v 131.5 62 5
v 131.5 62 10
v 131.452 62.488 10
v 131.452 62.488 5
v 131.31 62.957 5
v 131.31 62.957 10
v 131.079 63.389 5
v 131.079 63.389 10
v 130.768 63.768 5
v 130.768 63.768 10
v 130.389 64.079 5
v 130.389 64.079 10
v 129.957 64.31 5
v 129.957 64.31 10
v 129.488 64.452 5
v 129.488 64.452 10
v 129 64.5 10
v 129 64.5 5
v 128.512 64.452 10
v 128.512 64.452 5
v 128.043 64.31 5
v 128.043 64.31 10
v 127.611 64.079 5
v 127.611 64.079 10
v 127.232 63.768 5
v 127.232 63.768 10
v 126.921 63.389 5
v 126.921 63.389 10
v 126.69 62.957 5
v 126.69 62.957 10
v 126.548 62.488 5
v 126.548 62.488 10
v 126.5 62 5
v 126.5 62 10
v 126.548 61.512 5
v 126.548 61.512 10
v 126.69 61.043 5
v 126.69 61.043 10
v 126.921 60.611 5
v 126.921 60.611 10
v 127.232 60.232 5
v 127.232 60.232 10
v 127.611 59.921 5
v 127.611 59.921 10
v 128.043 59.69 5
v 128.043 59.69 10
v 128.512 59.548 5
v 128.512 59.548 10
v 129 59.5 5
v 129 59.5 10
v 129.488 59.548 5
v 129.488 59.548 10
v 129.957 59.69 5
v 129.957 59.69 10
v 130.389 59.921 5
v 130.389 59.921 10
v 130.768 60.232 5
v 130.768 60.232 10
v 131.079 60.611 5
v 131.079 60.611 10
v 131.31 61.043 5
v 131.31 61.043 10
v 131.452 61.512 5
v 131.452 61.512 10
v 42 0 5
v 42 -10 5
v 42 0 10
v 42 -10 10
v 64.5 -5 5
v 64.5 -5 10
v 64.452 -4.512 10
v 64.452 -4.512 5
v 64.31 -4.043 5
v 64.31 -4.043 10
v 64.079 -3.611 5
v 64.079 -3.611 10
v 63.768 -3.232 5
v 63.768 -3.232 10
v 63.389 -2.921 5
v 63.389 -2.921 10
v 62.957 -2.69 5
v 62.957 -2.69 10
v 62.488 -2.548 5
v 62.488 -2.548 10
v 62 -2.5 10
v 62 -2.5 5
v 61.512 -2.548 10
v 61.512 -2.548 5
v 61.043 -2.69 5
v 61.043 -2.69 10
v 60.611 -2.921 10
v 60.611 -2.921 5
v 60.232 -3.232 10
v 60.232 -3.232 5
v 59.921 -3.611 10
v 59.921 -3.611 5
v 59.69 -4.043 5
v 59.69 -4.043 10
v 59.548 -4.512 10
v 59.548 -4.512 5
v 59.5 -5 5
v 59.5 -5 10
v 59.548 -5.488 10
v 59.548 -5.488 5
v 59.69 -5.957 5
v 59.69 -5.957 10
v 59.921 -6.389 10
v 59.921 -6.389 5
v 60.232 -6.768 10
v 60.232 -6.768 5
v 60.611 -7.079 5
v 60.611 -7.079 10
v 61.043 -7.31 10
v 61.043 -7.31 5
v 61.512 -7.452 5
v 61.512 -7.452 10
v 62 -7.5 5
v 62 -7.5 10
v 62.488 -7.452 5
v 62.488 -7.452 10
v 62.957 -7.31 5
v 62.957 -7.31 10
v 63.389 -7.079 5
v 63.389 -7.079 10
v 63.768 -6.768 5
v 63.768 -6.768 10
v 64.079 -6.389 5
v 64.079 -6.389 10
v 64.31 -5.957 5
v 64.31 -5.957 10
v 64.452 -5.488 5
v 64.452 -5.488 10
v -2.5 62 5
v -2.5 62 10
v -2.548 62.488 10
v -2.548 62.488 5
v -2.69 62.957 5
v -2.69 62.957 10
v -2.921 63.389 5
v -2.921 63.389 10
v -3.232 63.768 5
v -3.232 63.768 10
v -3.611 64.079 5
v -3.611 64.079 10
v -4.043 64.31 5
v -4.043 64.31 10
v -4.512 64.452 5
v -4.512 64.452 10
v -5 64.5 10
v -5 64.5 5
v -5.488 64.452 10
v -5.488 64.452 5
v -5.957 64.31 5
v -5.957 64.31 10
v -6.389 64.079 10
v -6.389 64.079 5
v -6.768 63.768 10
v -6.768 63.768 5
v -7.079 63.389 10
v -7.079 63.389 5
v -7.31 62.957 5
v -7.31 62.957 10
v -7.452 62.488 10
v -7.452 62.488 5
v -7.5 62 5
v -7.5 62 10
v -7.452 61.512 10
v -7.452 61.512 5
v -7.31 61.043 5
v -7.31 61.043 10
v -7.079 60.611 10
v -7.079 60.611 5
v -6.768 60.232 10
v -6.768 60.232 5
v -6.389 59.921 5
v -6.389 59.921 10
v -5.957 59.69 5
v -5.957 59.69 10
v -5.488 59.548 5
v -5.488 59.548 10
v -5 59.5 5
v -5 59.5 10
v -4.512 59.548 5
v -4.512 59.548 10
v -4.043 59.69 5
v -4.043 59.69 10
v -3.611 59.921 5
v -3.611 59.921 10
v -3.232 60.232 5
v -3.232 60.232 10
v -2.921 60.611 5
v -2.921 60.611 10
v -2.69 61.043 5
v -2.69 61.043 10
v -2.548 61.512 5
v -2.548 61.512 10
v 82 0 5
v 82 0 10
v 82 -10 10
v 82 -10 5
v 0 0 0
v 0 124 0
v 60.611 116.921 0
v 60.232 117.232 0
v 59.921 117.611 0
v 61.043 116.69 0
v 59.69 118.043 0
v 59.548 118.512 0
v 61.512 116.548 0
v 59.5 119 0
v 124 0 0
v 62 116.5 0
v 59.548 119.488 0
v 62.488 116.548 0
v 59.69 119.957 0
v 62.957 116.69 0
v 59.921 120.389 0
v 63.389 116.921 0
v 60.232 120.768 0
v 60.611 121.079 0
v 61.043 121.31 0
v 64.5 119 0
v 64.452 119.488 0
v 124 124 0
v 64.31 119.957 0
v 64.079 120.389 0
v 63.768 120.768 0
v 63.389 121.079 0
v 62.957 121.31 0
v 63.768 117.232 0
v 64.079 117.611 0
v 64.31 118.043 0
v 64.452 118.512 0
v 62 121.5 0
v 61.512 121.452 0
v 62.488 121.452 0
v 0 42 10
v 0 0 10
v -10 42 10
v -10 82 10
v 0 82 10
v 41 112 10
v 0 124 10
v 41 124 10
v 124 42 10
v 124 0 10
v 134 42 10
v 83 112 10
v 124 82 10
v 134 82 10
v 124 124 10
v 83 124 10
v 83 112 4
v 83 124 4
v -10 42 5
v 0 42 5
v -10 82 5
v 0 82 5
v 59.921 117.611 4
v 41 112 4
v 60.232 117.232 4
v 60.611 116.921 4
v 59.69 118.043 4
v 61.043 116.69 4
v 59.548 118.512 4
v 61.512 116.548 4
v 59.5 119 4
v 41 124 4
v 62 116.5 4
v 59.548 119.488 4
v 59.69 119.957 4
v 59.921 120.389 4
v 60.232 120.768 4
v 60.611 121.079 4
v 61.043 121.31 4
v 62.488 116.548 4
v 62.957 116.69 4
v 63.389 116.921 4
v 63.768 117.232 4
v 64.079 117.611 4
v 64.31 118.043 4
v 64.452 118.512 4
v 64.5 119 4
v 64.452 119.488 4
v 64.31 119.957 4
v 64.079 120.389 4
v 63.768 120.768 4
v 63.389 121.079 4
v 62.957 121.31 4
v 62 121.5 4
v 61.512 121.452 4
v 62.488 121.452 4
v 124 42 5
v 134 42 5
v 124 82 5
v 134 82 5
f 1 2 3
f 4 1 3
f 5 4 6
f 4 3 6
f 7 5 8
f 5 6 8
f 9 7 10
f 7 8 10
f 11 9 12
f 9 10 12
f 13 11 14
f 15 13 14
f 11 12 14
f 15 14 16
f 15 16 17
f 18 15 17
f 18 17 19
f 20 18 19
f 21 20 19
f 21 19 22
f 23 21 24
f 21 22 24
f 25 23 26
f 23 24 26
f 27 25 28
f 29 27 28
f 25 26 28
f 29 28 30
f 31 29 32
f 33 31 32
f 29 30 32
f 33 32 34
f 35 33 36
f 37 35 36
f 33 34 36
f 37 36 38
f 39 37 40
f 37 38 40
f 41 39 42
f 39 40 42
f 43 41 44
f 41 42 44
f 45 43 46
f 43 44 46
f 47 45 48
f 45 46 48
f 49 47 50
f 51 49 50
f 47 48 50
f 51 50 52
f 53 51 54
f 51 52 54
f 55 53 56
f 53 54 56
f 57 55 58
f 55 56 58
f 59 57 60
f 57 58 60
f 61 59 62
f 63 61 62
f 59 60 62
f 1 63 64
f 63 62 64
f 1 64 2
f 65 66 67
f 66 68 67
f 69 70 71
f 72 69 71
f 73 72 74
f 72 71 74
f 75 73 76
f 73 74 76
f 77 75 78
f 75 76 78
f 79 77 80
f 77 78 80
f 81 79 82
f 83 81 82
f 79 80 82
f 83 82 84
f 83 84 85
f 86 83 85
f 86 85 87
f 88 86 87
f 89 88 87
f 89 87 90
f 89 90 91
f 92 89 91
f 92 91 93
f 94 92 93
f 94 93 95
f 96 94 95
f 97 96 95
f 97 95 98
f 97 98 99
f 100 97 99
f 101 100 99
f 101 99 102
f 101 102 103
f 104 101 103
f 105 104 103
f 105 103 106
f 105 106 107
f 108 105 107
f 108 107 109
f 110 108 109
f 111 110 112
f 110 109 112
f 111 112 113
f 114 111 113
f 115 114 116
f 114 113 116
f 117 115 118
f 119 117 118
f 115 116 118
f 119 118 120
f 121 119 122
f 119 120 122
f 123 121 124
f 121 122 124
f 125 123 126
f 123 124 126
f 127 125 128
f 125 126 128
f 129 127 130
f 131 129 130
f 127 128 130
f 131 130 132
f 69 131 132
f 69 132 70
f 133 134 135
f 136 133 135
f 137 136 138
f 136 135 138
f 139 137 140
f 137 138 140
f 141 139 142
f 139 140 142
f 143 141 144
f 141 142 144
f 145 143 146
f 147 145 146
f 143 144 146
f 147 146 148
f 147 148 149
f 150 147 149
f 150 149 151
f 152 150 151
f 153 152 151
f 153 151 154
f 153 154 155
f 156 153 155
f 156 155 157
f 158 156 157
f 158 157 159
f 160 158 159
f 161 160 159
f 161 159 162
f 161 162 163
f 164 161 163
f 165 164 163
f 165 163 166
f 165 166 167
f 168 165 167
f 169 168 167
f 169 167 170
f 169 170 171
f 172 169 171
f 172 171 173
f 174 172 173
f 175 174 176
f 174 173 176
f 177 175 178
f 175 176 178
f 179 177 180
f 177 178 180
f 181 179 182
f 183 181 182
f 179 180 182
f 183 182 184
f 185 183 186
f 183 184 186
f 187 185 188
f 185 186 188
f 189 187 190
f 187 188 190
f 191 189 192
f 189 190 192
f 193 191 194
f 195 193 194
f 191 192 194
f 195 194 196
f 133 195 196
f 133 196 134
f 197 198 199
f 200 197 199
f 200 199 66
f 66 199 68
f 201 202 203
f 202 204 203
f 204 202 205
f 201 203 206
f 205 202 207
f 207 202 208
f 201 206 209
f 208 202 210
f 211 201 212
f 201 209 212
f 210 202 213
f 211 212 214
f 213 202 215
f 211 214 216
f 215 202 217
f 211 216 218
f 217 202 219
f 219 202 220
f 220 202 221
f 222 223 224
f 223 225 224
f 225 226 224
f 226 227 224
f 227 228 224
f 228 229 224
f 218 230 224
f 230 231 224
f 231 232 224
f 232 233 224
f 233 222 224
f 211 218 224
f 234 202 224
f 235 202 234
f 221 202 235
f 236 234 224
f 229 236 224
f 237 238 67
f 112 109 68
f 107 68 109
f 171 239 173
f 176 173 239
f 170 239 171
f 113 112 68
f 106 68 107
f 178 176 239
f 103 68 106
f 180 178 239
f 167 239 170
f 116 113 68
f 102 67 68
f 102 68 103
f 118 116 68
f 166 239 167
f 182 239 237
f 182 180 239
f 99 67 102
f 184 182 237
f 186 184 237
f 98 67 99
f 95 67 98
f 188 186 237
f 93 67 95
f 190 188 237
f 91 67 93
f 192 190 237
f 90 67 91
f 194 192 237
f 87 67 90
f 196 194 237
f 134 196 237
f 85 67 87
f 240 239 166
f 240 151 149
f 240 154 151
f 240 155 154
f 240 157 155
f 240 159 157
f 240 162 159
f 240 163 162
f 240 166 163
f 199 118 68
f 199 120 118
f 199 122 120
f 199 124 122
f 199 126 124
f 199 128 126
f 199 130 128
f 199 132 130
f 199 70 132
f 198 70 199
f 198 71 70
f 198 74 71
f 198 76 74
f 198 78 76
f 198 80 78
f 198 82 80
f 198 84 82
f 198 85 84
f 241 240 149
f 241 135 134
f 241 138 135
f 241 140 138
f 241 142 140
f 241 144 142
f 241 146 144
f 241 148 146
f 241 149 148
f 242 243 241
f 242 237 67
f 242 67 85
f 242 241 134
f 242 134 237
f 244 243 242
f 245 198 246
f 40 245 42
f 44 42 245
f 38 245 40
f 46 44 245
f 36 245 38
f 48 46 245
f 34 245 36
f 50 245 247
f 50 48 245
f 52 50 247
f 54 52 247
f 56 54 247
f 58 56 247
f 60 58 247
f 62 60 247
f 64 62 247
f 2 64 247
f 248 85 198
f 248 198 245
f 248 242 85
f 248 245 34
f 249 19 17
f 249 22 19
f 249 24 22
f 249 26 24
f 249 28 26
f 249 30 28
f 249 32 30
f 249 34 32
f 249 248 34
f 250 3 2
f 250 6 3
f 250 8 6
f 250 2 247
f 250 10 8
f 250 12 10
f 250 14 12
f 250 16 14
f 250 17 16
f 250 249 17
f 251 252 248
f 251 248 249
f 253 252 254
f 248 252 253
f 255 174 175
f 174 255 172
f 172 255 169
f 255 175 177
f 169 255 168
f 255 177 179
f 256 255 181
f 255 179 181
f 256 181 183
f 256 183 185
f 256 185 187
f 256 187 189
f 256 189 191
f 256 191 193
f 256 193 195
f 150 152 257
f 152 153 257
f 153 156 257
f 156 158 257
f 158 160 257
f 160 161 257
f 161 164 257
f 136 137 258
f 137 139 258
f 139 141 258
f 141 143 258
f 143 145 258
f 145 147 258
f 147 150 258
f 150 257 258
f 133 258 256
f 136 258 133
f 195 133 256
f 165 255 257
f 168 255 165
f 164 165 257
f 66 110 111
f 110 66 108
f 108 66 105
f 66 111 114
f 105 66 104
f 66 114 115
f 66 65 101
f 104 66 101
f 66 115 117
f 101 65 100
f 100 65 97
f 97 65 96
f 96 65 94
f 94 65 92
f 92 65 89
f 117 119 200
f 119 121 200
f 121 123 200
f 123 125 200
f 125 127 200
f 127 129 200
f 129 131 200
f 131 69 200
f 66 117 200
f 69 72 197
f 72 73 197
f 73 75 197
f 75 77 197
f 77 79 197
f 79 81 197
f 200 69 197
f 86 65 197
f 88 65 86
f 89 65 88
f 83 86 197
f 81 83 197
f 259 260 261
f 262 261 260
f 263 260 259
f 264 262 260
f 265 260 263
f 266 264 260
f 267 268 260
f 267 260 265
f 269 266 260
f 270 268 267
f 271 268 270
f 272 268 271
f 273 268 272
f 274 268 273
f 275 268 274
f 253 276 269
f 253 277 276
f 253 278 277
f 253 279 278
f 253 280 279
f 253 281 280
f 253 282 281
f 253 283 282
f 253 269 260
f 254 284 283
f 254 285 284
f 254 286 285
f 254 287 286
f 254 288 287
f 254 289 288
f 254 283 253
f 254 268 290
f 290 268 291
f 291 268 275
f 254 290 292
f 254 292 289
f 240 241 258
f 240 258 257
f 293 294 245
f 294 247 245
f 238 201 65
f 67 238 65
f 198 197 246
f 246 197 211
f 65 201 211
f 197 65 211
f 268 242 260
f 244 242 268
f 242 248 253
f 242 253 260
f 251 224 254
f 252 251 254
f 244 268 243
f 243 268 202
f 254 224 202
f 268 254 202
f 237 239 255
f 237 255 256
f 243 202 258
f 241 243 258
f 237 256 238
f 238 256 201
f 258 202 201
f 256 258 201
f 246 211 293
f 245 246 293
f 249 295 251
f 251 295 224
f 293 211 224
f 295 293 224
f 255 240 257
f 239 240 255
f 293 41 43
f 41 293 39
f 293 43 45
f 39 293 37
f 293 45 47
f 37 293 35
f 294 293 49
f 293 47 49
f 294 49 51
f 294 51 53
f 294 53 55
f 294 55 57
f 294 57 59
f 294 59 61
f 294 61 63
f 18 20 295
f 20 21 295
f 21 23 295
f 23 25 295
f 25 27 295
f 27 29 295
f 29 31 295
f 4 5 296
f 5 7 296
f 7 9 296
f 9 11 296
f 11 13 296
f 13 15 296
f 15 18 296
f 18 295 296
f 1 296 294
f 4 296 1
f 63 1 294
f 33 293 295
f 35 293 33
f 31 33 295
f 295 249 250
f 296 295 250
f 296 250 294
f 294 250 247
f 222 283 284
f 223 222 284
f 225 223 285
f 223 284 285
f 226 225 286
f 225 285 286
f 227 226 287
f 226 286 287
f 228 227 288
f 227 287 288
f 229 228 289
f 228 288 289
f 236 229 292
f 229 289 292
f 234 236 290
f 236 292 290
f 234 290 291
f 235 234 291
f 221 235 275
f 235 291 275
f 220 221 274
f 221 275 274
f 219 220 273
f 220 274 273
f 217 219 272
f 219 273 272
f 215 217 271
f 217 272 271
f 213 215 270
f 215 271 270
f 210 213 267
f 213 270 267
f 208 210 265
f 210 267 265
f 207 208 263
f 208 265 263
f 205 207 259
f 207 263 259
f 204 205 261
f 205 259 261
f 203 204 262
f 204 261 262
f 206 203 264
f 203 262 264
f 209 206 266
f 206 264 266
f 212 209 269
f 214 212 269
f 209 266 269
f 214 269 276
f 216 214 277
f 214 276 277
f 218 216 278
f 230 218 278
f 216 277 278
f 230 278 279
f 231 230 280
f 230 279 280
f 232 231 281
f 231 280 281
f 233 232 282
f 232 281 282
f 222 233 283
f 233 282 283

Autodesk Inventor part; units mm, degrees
ref_plane "YZ Plane" through (0, 0, 0) normal (1, 0, 0) x (0, 1, 0)
ref_plane "XZ Plane" through (0, 0, 0) normal (0, 1, 0) x (-1, 0, 0)
ref_plane "XY Plane" through (0, 0, 0) normal (0, 0, 1) x (1, 0, 0)
sketch "Sketch1" plane through (0, 0, 0) normal (0, 0, 1) x (1, 0, 0)
  line L0 (0, 0) -> (124, 0)
  line L1 (124, 0) -> (124, 124)
  line L2 (124, 124) -> (0, 124)
  line L3 (0, 124) -> (0, 0)
  dimension "d0" = 124
  dimension "d1" = 124
extrude "Extrusion1" add sketch "Sketch1" along normal blind 10
sketch "Sketch2" plane through (0, 0, 10) normal (0, 0, 1) x (1, 0, 0)
  line L0 (0, 124) -> (0, 0) projected
  line L1 (0, 82) -> (-10, 82)
  line L2 (-10, 82) -> (-10, 42)
  line L3 (-10, 42) -> (0, 42)
  line L4 (0, 42) -> (0, 82)
  line L5 (0, 0) -> (124, 0) projected
  line L6 (42, 0) -> (82, 0)
  line L7 (82, 0) -> (82, -10)
  line L8 (82, -10) -> (42, -10)
  line L9 (42, -10) -> (42, 0)
  circle A0 centre (-5, 62) radius 2.5
  circle A1 centre (62, -5) radius 2.5
  point P0 (42, -5)
  point P1 (-10, 62)
  point P2 (-5, 82)
  point P3 (62, -10)
  point P4 (62, 0)
  point P5 (62, 0)
  point P6 (0, 62)
  dimension "d4" = 10
  dimension "d5" = 40
  dimension "d6" = 40
  dimension "d7" = 10
  dimension "d8" = 5
  dimension "d9" = 5
extrude "Extrusion2" add sketch "Sketch2" against normal blind 5
sketch "Sketch3" plane through (0, 0, 10) normal (0, 0, 1) x (1, 0, 0)
  line L0 (124, 124) -> (0, 124) projected
  line L1 (41, 124) -> (83, 124)
  line L2 (83, 124) -> (83, 112)
  line L3 (83, 112) -> (41, 112)
  line L4 (41, 112) -> (41, 124)
  point P0 (0, 0)
  point P1 (62, 112)
  point P2 (62, 124)
  dimension "d12" = 42
  dimension "d13" = 12
extrude "Extrusion3" cut sketch "Sketch3" against normal blind 6
sketch "Sketch4" plane through (0, 0, 4) normal (0, 0, 1) x (1, 0, 0)
  line L0 (41, 124) -> (83, 124) construction
  line L1 (41, 112) -> (41, 124) construction
  line L2 (83, 112) -> (41, 112) construction
  line L3 (83, 124) -> (83, 112) construction
  circle A0 centre (62, 119) radius 2.5
  point P0 (0, 0)
  point P1 (62, 124)
  dimension "d16" = 5
  dimension "d17" = 5
extrude "Extrusion4" cut sketch "Sketch4" against normal through all
sketch "Sketch5" plane through (0, 0, 10) normal (0, 0, 1) x (1, 0, 0)
  line L0 (124, 0) -> (124, 124) projected
  line L1 (124, 82) -> (134, 82)
  line L2 (134, 82) -> (134, 42)
  line L3 (134, 42) -> (124, 42)
  line L4 (124, 42) -> (124, 82)
  circle A0 centre (129, 62) radius 2.5
  point P0 (0, 0)
  point P1 (134, 62)
  point P2 (124, 62)
  point P3 (124, 62)
  point P4 (129, 82)
  dimension "d20" = 10
  dimension "d21" = 40
  dimension "d22" = 5
extrude "Extrusion5" add sketch "Sketch5" against normal blind 5
properties part number "TC006" material "ABS Plastic"
